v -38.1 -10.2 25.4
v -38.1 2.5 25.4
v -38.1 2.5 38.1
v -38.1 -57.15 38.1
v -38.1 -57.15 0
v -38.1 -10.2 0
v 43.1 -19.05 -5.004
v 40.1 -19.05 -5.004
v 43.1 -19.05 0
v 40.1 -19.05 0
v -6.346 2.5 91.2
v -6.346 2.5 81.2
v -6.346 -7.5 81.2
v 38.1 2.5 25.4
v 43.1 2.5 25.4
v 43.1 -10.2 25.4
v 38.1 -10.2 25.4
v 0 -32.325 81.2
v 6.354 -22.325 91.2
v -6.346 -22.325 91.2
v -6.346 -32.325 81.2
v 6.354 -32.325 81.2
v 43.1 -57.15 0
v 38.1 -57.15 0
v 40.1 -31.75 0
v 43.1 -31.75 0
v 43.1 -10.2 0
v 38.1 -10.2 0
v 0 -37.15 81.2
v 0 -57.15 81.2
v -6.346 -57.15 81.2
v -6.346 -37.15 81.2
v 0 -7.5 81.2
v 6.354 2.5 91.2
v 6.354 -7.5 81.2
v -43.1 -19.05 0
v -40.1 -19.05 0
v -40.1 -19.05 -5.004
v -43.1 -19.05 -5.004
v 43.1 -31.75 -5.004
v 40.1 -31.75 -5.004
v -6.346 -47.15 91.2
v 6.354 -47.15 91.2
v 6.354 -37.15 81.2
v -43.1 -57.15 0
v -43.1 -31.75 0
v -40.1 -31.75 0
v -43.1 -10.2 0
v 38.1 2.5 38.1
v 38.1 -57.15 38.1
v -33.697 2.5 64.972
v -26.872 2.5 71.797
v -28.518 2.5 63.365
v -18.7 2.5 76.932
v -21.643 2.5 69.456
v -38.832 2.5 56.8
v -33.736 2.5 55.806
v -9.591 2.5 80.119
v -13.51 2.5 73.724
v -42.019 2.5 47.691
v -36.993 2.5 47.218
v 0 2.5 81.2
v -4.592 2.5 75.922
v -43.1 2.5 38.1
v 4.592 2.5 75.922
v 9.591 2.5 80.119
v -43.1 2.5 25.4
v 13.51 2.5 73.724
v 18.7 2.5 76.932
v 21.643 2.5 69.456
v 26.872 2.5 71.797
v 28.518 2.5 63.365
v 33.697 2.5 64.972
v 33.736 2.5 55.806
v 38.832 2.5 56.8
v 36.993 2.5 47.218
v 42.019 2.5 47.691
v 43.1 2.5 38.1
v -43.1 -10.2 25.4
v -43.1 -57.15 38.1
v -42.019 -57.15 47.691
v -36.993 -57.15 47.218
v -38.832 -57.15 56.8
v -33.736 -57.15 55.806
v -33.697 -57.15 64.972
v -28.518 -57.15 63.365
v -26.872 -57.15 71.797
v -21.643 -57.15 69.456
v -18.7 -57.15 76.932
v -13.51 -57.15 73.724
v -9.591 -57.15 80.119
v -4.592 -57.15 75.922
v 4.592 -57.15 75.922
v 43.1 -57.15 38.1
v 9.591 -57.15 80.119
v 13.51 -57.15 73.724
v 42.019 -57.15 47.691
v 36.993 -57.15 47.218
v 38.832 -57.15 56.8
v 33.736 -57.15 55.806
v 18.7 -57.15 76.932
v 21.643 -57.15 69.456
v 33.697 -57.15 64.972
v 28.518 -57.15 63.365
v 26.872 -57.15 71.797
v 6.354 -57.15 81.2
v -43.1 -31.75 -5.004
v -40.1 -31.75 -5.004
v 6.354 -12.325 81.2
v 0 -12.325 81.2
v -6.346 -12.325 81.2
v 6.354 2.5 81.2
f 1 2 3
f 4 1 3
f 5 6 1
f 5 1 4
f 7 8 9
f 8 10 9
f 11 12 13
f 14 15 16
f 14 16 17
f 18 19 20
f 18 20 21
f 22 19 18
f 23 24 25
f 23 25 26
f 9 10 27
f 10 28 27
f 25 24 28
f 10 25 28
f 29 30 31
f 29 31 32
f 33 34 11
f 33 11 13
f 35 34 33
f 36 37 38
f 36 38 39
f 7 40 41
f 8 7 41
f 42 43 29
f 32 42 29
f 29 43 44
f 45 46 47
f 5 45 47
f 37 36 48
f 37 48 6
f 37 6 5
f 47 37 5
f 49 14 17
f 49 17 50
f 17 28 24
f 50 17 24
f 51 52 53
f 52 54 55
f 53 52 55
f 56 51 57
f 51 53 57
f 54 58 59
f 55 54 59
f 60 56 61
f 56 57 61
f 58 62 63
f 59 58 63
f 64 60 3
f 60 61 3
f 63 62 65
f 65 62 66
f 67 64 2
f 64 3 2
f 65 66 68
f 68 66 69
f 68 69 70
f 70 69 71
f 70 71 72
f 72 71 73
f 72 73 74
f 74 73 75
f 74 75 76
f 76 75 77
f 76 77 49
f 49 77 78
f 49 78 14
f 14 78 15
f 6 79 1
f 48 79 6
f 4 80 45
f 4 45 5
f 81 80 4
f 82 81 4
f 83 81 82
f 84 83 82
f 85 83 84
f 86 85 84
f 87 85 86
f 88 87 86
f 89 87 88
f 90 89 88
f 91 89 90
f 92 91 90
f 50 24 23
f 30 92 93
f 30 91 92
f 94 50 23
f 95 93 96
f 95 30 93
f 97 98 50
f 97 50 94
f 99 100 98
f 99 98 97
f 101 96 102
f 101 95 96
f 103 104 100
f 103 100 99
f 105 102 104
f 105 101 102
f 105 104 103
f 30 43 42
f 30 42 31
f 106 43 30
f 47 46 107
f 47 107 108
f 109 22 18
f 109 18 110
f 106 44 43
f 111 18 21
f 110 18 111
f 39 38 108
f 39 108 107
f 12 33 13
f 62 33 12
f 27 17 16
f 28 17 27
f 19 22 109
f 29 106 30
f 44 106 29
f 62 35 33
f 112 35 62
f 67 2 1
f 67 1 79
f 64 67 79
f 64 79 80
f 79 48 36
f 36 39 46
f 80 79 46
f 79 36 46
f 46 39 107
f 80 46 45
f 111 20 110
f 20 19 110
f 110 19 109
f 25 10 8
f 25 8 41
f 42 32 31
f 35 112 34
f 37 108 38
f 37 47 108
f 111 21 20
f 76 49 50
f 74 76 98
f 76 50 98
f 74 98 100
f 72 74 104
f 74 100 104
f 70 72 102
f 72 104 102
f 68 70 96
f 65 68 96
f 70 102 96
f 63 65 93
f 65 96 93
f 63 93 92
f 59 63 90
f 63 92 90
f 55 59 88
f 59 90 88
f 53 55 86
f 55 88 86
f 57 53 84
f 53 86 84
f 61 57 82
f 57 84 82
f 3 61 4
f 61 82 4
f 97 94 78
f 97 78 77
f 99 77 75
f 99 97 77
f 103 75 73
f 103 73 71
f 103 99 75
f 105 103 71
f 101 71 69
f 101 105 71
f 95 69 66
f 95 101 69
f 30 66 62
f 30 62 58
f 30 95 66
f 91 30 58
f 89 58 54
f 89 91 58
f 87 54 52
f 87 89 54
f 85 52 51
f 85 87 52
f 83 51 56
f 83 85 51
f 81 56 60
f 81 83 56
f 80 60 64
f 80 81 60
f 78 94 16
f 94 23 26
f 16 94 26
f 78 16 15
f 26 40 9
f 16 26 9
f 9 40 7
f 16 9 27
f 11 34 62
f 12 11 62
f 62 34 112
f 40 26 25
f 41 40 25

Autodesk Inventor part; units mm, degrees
ref_plane "YZ Plane" through (0, 0, 0) normal (1, 0, 0) x (0, 1, 0)
ref_plane "XZ Plane" through (0, 0, 0) normal (0, 1, 0) x (-1, 0, 0)
sketch "Sketch1" plane through (0, 0, 0) normal (0, 0, 1) x (1, 0, 0)
  arc A0 (-38.1, -57.15) -> (38.1, -57.15) centre (0, -57.15) ccw projected
  line L0 (38.1, -57.15) -> (43.1, -57.15) projected
  line L1 (43.1, -57.15) -> (43.1, 62.15) projected
  line L2 (43.1, 62.15) -> (-43.1, 62.15) projected
  line L3 (-43.1, 62.15) -> (-43.1, -57.15) projected
  line L4 (-43.1, -57.15) -> (-38.1, -57.15) projected
  line L5 (14, 57.15) -> (-14, 57.15) projected
  line L6 (14, 57.15) -> (14, 54.15) projected
  line L7 (14, 54.15) -> (-10.002, 54.15) projected
  line L8 (-10.002, 54.15) -> (-10.002, 53.078) projected
  line L9 (-10.002, 53.078) -> (-14, 53.078) projected
  line L10 (-14, 53.078) -> (-14, 57.15) projected
  line L11 (10.16, -7.55) -> (-10.16, -7.55) projected
  line L12 (-10.16, -7.55) -> (-10.16, 9.15) projected
  line L13 (-10.16, 9.15) -> (10.16, 9.15) projected
  line L14 (10.16, 9.15) -> (10.16, -7.55) projected
  circle A1 centre (0, -77.15) radius 5 projected
  line L15 (-19.058, -20.782) -> (-19.058, -16.21) projected
  line L16 (-19.058, -16.21) -> (-17.058, -16.21) projected
  line L17 (-17.058, -16.21) -> (-17.058, -22.782) projected
  line L18 (-17.058, -22.782) -> (-24.598, -22.782) projected
  line L19 (-24.598, -22.782) -> (-24.598, -16.21) projected
  line L20 (-24.598, -16.21) -> (-22.598, -16.21) projected
  line L21 (-22.598, -16.21) -> (-22.598, -20.782) projected
  line L22 (-22.598, -20.782) -> (-19.058, -20.782) projected
  line L23 (-19.058, 7.65) -> (-19.058, 12.222) projected
  line L24 (-19.058, 12.222) -> (-22.598, 12.222) projected
  line L25 (-22.598, 12.222) -> (-22.598, 7.65) projected
  line L26 (-22.598, 7.65) -> (-24.598, 7.65) projected
  line L27 (-24.598, 7.65) -> (-24.598, 14.222) projected
  line L28 (-24.598, 14.222) -> (-17.058, 14.222) projected
  line L29 (-17.058, 14.222) -> (-17.058, 7.65) projected
  line L30 (-17.058, 7.65) -> (-19.058, 7.65) projected
  line L31 (-6.662, 29.218) -> (-6.662, 22.4) projected
  line L32 (-6.662, 22.4) -> (7.275, 22.4) projected
  line L33 (7.275, 22.4) -> (7.275, 19.4) projected
  line L34 (7.275, 19.4) -> (-14.202, 19.4) projected
  line L35 (-14.202, 19.4) -> (-14.202, 29.218) projected
  line L36 (-14.202, 29.218) -> (-12.202, 29.218) projected
  line L37 (-12.202, 29.218) -> (-12.202, 29.221) projected
  line L38 (-12.202, 29.221) -> (-8.662, 29.221) projected
  line L39 (-8.662, 29.221) -> (-8.662, 29.218) projected
  line L40 (-8.662, 29.218) -> (-6.662, 29.218) projected
  line L41 (38.1, -57.15) -> (43.1, -57.15)
  line L42 (43.1, -57.15) -> (43.1, 62.15)
  line L43 (43.1, 62.15) -> (38.1, 62.15)
  line L44 (38.1, 62.15) -> (38.1, -57.15)
  line L45 (-38.1, -57.15) -> (-43.1, -57.15)
  line L46 (-43.1, -57.15) -> (-43.1, 62.15)
  line L47 (-43.1, 62.15) -> (-38.1, 62.15)
  line L48 (-38.1, 62.15) -> (-38.1, -57.15)
  line L49 (-43.1, 62.15) -> (-43.1, 57.15)
  line L50 (-43.1, 57.15) -> (43.1, 57.15)
  line L51 (43.1, 57.15) -> (-43.1, 57.15)
  line L52 (-43.1, 57.15) -> (-43.1, 62.15)
  line L53 (-43.1, 62.15) -> (43.1, 62.15)
  line L54 (43.1, 62.15) -> (43.1, 57.15)
  point P0 (0, 0)
  dimension "d0" = 5
extrude "Extrusion1" add sketch "Sketch1" along normal blind 38.1 contours L4 L3 L50 L48 | L44 L50 L1 L0 | L50 L3 L2 L48 | L48 L2 L44 L50 L5 | L44 L2 L1 L50
sketch "Sketch2" plane through (-43.1, -57.15, 0) normal (0, -1, 0) x (1, 0, 0)
  line L0 (5, 38.1) -> (81.2, 38.1) projected
  arc A0 (81.2, 38.1) -> (5, 38.1) centre (43.1, 38.1) ccw
  line L1 (0, 38.1) -> (5, 38.1) projected
  arc A1 (86.2, 38.1) -> (0, 38.1) centre (43.1, 38.1) ccw
  line L2 (0, 38.1) -> (5, 38.1)
  line L3 (81.2, 38.1) -> (86.2, 38.1) projected
  line L4 (81.2, 38.1) -> (86.2, 38.1)
  point P0 (43.1, 0)
extrude "Extrusion2" add sketch "Sketch2" against normal blind 119.3 contours L1 A1 L3 A0
sketch "Sketch3" plane through (-43.1, 62.15, 0) normal (0, 1, 0) x (1, 0, 0)
  arc A0 (5, -38.1) -> (81.2, -38.1) centre (43.1, -38.1) ccw projected
  line L0 (81.2, -38.1) -> (5, -38.1) projected
  point P0 (43.1, 0)
extrude "Extrusion3" add sketch "Sketch3" against normal blind 5
sketch "Sketch4" plane through (-43.1, 62.15, 0) normal (0, 1, 0) x (1, 0, 0)
  circle A0 centre (43.1, -23.375) radius 3.275 projected
  point P0 (43.1, 0)
extrude "Extrusion4" cut sketch "Sketch4" against normal blind 5
ref_plane "Work Plane1" through (0.0038, -57.15, 0) normal (-1, 0, 0) x (0, 0, 1)
sketch "Sketch5" plane through (0.0038, -57.15, 0) normal (-1, 0, 0) x (0, 0, 1)
  point P0 (0, 57.15)
sketch "Sketch6" plane through (0.0038, -57.15, 0) normal (-1, 0, 0) x (0, 0, 1)
  line L0 (81.2, 0) -> (81.2, 119.3) projected
  line L1 (81.2, 119.3) -> (81.2, 99.3)
  line L2 (81.2, 109.3) -> (91.2, 109.3)
  line L3 (91.2, 109.3) -> (81.2, 119.3)
  line L4 (91.2, 109.3) -> (81.2, 99.3)
  line L5 (91.2, 84.475) -> (81.2, 74.475)
  line L6 (81.2, 84.475) -> (91.2, 84.475)
  line L7 (81.2, 94.475) -> (81.2, 74.475)
  line L8 (91.2, 84.475) -> (81.2, 94.475)
  line L9 (91.2, 59.65) -> (81.2, 49.65)
  line L10 (81.2, 59.65) -> (91.2, 59.65)
  line L11 (81.2, 69.65) -> (81.2, 49.65)
  line L12 (91.2, 59.65) -> (81.2, 69.65)
  line L13 (91.2, 34.825) -> (81.2, 24.825)
  line L14 (81.2, 34.825) -> (91.2, 34.825)
  line L15 (81.2, 44.825) -> (81.2, 24.825)
  line L16 (91.2, 34.825) -> (81.2, 44.825)
  line L17 (91.2, 10) -> (81.2, 0)
  line L18 (81.2, 10) -> (91.2, 10)
  line L19 (81.2, 20) -> (81.2, 0)
  line L20 (91.2, 10) -> (81.2, 20)
  point P0 (0, 57.15)
  dimension "d10" = 20
  dimension "d11" = 10
  dimension "d14" = 24.825
extrude "Extrusion5" add sketch "Sketch6" along normal mid plane 12.7
sketch "Sketch8" plane through (0, 0, 0) normal (0, 0, -1) x (-1, 0, 0)
  line L0 (40.1, 24.05) -> (40.1, 36.75) projected
  line L1 (40.1, -31.75) -> (40.1, -19.05) projected
  line L2 (-40.1, 36.75) -> (-40.1, 24.05) projected
  line L3 (-40.1, -19.05) -> (-40.1, -31.75) projected
  line L4 (43.1, 62.15) -> (43.1, -57.15) projected
  line L5 (40.1, 36.75) -> (43.1, 36.75)
  line L6 (43.1, 36.75) -> (43.1, 24.05)
  line L7 (43.1, 24.05) -> (40.1, 24.05)
  line L8 (40.1, 24.05) -> (40.1, 36.75)
  line L9 (40.1, -19.05) -> (43.1, -19.05)
  line L10 (43.1, -19.05) -> (43.1, -31.75)
  line L11 (43.1, -31.75) -> (40.1, -31.75)
  line L12 (40.1, -31.75) -> (40.1, -19.05)
  line L13 (-43.1, -57.15) -> (-43.1, 62.15) projected
  line L14 (-40.1, -19.05) -> (-43.1, -19.05)
  line L15 (-43.1, -19.05) -> (-43.1, -31.75)
  line L16 (-43.1, -31.75) -> (-40.1, -31.75)
  line L17 (-40.1, -31.75) -> (-40.1, -19.05)
  line L18 (-40.1, 24.05) -> (-43.1, 24.05)
  line L19 (-43.1, 24.05) -> (-43.1, 36.75)
  line L20 (-43.1, 36.75) -> (-40.1, 36.75)
  line L21 (-40.1, 36.75) -> (-40.1, 24.05)
  point P0 (0, 0)
extrude "Extrusion6" add sketch "Sketch8" along normal blind 5.0038
sketch "Sketch9" plane through (43.1, -57.15, 38.1) normal (1, 0, 0) x (0, 0, -1)
  line L0 (-53.1, 59.65) -> (-43.1, 69.65) projected
  line L1 (-53.1, 59.65) -> (78.849, 59.65)
  line L2 (78.849, 59.65) -> (83.1956, -43.5453)
  line L3 (83.1956, -43.5453) -> (-80.8871, -47.5296)
  line L4 (-80.8871, -47.5296) -> (-53.1, 59.65)
  line L5 (-53.1, 59.65) -> (-110.6171, 127.1671)
  line L6 (-110.6171, 127.1671) -> (38.1, 222.9682)
  line L7 (38.1, 222.9682) -> (78.849, 59.65)
  point P0 (38.1, 57.15)
extrude "Extrusion7" cut sketch "Sketch9" against normal blind 2540 contours L5 L6 L7 L1
sketch "Sketch10" plane through (-43.1, -57.15, 0) normal (-1, 0, 0) x (0, 0, 1)
  line L0 (38.1, 59.65) -> (0, 59.65) projected
  line L1 (0, 59.65) -> (38.1, 59.65)
  line L2 (38.1, 59.65) -> (38.1, 46.95)
  line L3 (38.1, 46.95) -> (0, 46.95)
  line L4 (0, 46.95) -> (0, 59.65)
  point P0 (0, 57.15)
  dimension "d25" = 12.7
extrude "Extrusion8" cut sketch "Sketch10" against normal blind 1955.8
sketch "Sketch11" plane through (43.1, 2.5, 38.1) normal (0, 0, -1) x (-1, 0, 0)
  line L0 (81.2, -12.7) -> (81.2, 0) projected
  line L1 (86.2, -12.7) -> (81.2, -12.7) projected
  line L2 (86.2, 0) -> (86.2, -12.7) projected
  line L3 (81.2, 0) -> (86.2, 0) projected
  line L4 (5, 0) -> (5, -12.7) projected
  line L5 (5, 0) -> (5, -12.7) projected
  line L6 (0, 0) -> (5, 0) projected
  line L7 (0, -12.7) -> (0, 0) projected
  line L8 (5, -12.7) -> (0, -12.7) projected
  point P0 (43.1, -2.5)
extrude "Extrusion9" add sketch "Sketch11" along normal blind 12.7
properties part number "Skin2V2"
